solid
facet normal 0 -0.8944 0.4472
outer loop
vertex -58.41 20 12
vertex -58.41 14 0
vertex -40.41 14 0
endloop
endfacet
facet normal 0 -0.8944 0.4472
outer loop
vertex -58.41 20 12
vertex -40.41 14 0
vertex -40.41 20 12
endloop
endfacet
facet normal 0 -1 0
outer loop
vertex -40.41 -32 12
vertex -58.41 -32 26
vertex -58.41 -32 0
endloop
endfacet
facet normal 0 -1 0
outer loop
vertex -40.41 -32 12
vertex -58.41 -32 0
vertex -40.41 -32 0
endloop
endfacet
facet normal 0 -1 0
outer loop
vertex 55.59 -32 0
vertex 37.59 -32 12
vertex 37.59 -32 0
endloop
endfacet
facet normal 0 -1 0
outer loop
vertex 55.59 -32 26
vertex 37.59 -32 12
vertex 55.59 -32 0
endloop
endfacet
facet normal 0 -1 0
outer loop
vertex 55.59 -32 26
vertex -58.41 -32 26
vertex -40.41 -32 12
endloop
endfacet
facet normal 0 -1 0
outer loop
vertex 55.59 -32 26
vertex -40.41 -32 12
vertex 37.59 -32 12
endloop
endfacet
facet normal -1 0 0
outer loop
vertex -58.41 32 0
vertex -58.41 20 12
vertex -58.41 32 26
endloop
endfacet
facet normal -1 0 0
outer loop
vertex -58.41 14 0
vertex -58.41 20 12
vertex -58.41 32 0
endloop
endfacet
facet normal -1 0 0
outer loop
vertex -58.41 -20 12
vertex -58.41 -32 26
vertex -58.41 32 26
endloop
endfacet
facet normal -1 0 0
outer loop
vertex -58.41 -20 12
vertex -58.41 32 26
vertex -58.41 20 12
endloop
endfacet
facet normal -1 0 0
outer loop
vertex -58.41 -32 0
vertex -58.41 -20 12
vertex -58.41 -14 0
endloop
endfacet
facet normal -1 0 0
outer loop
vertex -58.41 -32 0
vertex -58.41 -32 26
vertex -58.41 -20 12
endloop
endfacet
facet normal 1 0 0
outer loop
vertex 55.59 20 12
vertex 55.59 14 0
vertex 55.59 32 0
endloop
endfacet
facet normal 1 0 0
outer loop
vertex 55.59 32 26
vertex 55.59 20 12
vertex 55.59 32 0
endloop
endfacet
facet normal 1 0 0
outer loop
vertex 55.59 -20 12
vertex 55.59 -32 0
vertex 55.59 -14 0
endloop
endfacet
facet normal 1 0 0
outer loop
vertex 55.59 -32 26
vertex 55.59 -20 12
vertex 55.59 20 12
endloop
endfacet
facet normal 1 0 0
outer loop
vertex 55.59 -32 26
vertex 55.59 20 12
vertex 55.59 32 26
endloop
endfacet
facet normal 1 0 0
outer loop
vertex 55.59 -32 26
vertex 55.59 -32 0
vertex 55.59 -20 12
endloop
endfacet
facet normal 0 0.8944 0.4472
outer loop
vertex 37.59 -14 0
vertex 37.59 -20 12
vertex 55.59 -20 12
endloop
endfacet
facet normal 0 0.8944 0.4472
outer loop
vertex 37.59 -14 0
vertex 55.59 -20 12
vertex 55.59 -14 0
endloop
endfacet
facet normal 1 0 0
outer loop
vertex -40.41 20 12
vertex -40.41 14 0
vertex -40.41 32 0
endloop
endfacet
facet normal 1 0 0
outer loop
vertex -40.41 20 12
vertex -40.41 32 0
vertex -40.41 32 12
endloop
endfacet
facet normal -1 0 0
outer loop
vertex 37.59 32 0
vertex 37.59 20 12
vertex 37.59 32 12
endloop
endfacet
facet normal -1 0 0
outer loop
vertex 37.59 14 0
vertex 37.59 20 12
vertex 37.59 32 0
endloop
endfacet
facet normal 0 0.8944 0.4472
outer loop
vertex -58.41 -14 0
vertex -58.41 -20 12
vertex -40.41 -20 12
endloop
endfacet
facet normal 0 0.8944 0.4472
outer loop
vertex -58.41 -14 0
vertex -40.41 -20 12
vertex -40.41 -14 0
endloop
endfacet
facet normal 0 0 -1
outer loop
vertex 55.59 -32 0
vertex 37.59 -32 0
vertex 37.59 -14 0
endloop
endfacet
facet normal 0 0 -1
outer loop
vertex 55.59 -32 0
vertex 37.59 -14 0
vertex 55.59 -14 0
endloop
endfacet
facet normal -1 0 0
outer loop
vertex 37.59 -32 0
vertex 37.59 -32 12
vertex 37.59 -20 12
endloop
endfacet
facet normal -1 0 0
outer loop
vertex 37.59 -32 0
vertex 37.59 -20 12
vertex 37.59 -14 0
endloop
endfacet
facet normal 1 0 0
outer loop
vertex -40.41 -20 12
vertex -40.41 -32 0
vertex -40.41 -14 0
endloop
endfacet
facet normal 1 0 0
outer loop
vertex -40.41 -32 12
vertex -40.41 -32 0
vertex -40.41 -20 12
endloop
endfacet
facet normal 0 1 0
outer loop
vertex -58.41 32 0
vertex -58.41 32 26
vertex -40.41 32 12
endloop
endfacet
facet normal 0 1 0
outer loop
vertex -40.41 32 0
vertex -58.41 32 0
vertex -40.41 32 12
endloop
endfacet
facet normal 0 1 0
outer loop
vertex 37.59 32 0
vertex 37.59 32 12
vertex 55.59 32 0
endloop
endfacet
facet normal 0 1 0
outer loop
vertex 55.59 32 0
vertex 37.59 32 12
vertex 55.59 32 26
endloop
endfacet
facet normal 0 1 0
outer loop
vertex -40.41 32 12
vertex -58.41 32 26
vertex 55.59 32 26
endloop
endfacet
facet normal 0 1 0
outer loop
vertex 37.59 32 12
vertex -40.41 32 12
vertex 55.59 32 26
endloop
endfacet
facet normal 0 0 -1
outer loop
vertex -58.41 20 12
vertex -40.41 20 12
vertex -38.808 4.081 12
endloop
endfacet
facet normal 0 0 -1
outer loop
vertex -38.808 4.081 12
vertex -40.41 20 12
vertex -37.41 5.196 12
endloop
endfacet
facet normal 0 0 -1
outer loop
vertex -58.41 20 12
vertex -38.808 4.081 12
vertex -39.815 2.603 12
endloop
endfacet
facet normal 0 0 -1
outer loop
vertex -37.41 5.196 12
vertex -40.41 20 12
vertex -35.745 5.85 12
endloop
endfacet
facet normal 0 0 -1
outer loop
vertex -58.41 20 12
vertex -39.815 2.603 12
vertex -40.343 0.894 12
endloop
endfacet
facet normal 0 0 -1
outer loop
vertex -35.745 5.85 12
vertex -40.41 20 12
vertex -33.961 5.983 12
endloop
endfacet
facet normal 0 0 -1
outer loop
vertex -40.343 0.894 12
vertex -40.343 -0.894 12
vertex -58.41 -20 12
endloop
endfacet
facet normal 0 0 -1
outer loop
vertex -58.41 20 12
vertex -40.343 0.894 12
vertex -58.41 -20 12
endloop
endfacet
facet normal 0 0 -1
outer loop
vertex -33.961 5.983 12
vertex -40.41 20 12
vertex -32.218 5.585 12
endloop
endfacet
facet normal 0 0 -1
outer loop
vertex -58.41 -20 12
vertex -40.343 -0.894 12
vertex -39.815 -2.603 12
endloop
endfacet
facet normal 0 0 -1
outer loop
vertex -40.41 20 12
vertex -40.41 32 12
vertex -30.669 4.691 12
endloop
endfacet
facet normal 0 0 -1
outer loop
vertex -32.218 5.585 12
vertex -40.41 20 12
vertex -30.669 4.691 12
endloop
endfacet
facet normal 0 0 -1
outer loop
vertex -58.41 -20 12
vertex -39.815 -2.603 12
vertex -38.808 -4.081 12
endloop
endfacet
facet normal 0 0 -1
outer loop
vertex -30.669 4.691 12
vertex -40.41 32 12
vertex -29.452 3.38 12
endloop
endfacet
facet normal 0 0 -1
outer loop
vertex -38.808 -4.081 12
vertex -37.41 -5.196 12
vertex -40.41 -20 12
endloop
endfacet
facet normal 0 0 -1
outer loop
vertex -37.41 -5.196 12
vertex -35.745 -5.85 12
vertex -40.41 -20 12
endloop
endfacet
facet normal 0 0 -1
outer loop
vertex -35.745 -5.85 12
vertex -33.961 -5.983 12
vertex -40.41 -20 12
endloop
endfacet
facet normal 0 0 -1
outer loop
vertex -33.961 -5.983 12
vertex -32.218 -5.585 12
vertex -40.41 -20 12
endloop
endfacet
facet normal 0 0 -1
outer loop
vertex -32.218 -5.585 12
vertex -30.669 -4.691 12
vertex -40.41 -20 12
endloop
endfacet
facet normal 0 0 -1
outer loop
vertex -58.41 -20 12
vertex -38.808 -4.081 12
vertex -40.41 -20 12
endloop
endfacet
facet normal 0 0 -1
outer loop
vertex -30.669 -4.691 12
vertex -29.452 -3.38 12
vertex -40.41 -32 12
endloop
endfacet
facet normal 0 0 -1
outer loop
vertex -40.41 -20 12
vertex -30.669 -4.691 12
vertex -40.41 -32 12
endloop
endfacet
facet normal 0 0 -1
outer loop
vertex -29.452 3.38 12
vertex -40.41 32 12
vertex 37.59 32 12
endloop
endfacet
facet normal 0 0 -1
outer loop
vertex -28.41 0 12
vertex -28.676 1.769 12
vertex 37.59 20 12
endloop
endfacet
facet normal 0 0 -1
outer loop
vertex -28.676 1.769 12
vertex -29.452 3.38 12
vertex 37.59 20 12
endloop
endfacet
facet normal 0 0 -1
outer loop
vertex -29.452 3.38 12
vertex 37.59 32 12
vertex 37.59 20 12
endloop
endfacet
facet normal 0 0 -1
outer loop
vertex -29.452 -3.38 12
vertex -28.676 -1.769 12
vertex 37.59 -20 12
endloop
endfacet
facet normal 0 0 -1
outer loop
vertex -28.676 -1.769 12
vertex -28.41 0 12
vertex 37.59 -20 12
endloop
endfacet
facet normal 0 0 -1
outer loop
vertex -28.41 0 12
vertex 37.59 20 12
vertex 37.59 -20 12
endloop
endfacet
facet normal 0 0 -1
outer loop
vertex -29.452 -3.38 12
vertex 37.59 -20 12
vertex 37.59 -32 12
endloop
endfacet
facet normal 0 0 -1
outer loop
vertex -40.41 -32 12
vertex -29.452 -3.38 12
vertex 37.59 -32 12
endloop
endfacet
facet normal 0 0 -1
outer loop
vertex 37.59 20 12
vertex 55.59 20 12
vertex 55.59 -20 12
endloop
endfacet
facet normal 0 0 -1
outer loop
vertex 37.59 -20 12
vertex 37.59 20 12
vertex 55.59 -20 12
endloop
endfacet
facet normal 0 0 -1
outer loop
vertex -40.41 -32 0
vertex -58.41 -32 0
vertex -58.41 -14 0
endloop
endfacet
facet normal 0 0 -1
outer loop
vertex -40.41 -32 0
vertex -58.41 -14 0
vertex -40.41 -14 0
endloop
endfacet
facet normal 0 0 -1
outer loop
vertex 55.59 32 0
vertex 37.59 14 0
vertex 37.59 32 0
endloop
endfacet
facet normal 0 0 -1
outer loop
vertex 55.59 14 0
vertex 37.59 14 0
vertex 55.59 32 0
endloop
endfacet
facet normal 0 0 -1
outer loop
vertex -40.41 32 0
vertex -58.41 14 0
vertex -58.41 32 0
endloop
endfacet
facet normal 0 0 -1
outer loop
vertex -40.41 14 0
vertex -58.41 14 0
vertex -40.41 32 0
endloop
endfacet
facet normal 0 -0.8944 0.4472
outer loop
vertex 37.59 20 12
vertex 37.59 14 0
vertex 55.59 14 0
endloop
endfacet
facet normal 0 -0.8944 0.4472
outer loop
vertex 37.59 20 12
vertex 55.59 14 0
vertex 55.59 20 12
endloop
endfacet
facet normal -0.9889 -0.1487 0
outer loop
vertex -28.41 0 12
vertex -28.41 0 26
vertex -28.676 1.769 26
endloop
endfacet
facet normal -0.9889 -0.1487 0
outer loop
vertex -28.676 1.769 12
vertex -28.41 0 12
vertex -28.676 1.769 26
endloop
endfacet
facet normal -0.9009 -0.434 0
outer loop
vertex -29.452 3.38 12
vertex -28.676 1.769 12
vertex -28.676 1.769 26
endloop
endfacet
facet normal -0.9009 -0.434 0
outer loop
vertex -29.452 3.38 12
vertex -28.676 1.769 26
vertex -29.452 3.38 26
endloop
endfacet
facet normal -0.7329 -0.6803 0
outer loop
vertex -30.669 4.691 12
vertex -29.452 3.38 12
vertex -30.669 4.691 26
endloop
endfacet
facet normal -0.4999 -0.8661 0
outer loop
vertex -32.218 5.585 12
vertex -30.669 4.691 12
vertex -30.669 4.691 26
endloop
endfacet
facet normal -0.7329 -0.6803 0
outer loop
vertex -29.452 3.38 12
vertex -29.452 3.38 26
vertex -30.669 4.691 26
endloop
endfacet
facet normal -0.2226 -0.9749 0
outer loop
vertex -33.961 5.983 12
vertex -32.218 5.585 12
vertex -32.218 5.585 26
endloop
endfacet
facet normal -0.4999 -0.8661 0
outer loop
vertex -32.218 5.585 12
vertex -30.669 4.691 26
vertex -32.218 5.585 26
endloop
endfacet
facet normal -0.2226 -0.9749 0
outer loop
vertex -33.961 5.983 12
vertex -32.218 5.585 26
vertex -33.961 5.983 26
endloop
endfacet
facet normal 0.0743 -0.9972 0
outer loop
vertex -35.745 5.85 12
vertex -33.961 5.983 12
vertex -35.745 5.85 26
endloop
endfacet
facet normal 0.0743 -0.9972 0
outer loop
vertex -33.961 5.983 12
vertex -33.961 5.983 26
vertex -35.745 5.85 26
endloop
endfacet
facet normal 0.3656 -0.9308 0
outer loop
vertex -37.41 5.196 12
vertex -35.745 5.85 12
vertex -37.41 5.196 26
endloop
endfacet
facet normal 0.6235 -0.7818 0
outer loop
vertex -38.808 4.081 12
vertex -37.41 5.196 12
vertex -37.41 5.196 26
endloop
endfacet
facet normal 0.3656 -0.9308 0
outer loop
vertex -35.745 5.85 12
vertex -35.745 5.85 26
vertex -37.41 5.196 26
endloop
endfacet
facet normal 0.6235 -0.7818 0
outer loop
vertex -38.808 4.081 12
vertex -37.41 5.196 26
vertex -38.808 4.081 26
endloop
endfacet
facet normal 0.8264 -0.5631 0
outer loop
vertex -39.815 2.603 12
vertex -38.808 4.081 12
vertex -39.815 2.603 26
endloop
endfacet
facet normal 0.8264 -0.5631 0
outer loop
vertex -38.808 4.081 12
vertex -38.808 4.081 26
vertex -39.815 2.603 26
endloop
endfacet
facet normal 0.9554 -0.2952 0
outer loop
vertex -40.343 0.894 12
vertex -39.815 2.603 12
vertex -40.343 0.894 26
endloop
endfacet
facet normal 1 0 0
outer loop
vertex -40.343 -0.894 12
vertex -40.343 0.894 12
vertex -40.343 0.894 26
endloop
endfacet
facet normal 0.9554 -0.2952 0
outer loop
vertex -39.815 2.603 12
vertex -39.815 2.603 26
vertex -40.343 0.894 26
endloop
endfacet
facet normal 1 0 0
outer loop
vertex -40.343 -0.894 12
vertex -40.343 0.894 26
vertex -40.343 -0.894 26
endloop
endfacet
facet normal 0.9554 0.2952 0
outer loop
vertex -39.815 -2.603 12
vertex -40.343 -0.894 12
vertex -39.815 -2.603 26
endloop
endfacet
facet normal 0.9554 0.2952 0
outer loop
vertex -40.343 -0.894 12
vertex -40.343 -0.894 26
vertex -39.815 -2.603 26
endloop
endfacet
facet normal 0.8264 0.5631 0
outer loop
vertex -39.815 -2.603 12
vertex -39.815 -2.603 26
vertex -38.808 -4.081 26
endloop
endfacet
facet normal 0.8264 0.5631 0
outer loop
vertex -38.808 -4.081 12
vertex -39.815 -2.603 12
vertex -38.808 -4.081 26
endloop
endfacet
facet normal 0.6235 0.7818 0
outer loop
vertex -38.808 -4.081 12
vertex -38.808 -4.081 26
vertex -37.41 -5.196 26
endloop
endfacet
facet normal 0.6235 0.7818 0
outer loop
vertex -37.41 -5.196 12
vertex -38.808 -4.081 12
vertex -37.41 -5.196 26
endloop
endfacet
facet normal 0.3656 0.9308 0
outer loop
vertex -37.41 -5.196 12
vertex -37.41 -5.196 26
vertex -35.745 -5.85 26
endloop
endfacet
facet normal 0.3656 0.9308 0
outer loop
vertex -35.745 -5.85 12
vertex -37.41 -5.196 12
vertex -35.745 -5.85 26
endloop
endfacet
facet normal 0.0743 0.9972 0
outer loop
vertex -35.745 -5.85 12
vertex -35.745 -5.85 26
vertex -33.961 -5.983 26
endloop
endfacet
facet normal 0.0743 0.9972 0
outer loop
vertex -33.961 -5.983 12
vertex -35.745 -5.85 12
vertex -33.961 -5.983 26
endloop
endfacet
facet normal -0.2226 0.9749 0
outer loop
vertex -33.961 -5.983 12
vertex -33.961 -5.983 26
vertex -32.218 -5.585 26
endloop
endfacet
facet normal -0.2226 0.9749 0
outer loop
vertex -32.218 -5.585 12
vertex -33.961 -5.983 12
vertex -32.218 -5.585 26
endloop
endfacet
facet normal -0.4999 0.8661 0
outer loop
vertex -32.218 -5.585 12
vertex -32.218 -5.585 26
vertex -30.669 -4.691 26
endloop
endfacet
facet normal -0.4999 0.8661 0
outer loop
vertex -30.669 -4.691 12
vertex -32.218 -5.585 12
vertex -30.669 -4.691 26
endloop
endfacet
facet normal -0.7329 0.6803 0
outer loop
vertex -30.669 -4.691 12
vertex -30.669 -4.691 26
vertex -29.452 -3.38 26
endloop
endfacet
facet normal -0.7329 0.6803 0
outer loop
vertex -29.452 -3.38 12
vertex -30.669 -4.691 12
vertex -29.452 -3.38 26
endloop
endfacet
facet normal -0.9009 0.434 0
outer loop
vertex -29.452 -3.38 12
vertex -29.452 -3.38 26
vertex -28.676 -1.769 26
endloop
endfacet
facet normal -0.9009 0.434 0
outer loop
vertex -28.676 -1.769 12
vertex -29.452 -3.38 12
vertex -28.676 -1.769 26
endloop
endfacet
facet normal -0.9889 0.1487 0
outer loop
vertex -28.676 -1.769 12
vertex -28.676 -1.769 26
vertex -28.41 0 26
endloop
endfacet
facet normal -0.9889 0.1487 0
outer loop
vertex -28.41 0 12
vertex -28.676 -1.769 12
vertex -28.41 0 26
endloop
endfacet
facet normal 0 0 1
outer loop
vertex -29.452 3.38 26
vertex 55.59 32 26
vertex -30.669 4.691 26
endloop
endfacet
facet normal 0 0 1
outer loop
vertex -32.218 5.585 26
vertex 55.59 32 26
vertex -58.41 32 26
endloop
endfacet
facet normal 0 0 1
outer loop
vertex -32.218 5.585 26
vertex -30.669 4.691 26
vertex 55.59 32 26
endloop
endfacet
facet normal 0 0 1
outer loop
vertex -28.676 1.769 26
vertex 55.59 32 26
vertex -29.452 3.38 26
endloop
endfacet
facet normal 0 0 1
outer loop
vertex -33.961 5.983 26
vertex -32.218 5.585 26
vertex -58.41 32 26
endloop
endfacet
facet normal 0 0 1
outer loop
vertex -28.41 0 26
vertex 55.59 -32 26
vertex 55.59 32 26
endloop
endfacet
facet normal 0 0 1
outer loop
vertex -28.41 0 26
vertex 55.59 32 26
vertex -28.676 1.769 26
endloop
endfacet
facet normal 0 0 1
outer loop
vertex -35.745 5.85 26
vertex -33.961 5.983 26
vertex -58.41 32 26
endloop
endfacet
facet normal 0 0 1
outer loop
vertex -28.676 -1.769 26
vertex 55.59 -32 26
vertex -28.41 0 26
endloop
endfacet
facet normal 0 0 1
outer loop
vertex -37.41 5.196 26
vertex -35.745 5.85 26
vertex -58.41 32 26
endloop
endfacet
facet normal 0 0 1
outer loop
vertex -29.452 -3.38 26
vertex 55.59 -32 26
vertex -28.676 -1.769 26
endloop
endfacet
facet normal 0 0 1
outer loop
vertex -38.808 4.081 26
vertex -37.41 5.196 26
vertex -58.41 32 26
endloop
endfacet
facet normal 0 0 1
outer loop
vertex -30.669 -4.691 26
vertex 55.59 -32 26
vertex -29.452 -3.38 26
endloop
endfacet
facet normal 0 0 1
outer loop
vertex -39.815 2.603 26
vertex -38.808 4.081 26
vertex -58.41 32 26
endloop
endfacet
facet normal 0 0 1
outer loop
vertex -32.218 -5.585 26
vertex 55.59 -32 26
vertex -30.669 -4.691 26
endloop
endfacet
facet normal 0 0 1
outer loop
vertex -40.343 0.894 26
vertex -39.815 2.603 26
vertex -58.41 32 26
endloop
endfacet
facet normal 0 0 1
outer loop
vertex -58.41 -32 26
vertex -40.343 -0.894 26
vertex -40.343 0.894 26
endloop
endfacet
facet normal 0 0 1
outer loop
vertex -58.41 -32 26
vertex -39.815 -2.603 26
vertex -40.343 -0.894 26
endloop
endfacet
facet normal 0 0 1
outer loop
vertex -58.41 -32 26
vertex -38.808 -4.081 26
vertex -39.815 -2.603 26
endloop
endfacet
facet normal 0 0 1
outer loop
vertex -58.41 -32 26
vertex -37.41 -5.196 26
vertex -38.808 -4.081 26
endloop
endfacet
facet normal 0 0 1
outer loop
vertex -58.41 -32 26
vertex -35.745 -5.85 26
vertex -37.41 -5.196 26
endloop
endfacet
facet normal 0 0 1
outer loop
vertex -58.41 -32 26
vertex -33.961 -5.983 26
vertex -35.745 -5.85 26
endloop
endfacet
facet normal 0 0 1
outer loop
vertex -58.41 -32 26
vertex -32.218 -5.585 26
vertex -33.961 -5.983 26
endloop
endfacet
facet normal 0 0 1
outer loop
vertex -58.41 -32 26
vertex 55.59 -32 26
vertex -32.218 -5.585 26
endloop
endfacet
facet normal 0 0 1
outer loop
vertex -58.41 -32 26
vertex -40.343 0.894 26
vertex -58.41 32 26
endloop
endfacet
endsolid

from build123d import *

# Parameters (mm, degrees)
F1_DEPTH = 32
F2_R     = 6
F3_DEPTH = 25
F6_DEPTH = 1000


with BuildPart() as f1:
    # F0 (on Front) → F1 (new body, symmetric)
    with BuildSketch(Plane.XZ):
        Polygon((-58.409637, 26), (-58.409637, 0), (-40.409637, 0), (-40.409637, 12), (37.590363, 12), (37.590363, 0), (55.590363, 0), (55.590363, 26), align=None)
    extrude(amount=F1_DEPTH, both=True)

    # F2 (on face) → F3 (cut)
    with BuildSketch(Plane.XY.offset(26)):
        with Locations((-34.409637, 0)):
            Circle(F2_R)
    extrude(amount=-F3_DEPTH, mode=Mode.SUBTRACT)

    # F5 (on face) → F6 (cut)
    with BuildSketch(Plane.YZ.offset(55.590363)):
        Polygon((-14, 0), (0, 0), (14, 0), (20, 12), (0, 12), (-20, 12), align=None)
    extrude(amount=-F6_DEPTH, mode=Mode.SUBTRACT)


solid = f1.part
